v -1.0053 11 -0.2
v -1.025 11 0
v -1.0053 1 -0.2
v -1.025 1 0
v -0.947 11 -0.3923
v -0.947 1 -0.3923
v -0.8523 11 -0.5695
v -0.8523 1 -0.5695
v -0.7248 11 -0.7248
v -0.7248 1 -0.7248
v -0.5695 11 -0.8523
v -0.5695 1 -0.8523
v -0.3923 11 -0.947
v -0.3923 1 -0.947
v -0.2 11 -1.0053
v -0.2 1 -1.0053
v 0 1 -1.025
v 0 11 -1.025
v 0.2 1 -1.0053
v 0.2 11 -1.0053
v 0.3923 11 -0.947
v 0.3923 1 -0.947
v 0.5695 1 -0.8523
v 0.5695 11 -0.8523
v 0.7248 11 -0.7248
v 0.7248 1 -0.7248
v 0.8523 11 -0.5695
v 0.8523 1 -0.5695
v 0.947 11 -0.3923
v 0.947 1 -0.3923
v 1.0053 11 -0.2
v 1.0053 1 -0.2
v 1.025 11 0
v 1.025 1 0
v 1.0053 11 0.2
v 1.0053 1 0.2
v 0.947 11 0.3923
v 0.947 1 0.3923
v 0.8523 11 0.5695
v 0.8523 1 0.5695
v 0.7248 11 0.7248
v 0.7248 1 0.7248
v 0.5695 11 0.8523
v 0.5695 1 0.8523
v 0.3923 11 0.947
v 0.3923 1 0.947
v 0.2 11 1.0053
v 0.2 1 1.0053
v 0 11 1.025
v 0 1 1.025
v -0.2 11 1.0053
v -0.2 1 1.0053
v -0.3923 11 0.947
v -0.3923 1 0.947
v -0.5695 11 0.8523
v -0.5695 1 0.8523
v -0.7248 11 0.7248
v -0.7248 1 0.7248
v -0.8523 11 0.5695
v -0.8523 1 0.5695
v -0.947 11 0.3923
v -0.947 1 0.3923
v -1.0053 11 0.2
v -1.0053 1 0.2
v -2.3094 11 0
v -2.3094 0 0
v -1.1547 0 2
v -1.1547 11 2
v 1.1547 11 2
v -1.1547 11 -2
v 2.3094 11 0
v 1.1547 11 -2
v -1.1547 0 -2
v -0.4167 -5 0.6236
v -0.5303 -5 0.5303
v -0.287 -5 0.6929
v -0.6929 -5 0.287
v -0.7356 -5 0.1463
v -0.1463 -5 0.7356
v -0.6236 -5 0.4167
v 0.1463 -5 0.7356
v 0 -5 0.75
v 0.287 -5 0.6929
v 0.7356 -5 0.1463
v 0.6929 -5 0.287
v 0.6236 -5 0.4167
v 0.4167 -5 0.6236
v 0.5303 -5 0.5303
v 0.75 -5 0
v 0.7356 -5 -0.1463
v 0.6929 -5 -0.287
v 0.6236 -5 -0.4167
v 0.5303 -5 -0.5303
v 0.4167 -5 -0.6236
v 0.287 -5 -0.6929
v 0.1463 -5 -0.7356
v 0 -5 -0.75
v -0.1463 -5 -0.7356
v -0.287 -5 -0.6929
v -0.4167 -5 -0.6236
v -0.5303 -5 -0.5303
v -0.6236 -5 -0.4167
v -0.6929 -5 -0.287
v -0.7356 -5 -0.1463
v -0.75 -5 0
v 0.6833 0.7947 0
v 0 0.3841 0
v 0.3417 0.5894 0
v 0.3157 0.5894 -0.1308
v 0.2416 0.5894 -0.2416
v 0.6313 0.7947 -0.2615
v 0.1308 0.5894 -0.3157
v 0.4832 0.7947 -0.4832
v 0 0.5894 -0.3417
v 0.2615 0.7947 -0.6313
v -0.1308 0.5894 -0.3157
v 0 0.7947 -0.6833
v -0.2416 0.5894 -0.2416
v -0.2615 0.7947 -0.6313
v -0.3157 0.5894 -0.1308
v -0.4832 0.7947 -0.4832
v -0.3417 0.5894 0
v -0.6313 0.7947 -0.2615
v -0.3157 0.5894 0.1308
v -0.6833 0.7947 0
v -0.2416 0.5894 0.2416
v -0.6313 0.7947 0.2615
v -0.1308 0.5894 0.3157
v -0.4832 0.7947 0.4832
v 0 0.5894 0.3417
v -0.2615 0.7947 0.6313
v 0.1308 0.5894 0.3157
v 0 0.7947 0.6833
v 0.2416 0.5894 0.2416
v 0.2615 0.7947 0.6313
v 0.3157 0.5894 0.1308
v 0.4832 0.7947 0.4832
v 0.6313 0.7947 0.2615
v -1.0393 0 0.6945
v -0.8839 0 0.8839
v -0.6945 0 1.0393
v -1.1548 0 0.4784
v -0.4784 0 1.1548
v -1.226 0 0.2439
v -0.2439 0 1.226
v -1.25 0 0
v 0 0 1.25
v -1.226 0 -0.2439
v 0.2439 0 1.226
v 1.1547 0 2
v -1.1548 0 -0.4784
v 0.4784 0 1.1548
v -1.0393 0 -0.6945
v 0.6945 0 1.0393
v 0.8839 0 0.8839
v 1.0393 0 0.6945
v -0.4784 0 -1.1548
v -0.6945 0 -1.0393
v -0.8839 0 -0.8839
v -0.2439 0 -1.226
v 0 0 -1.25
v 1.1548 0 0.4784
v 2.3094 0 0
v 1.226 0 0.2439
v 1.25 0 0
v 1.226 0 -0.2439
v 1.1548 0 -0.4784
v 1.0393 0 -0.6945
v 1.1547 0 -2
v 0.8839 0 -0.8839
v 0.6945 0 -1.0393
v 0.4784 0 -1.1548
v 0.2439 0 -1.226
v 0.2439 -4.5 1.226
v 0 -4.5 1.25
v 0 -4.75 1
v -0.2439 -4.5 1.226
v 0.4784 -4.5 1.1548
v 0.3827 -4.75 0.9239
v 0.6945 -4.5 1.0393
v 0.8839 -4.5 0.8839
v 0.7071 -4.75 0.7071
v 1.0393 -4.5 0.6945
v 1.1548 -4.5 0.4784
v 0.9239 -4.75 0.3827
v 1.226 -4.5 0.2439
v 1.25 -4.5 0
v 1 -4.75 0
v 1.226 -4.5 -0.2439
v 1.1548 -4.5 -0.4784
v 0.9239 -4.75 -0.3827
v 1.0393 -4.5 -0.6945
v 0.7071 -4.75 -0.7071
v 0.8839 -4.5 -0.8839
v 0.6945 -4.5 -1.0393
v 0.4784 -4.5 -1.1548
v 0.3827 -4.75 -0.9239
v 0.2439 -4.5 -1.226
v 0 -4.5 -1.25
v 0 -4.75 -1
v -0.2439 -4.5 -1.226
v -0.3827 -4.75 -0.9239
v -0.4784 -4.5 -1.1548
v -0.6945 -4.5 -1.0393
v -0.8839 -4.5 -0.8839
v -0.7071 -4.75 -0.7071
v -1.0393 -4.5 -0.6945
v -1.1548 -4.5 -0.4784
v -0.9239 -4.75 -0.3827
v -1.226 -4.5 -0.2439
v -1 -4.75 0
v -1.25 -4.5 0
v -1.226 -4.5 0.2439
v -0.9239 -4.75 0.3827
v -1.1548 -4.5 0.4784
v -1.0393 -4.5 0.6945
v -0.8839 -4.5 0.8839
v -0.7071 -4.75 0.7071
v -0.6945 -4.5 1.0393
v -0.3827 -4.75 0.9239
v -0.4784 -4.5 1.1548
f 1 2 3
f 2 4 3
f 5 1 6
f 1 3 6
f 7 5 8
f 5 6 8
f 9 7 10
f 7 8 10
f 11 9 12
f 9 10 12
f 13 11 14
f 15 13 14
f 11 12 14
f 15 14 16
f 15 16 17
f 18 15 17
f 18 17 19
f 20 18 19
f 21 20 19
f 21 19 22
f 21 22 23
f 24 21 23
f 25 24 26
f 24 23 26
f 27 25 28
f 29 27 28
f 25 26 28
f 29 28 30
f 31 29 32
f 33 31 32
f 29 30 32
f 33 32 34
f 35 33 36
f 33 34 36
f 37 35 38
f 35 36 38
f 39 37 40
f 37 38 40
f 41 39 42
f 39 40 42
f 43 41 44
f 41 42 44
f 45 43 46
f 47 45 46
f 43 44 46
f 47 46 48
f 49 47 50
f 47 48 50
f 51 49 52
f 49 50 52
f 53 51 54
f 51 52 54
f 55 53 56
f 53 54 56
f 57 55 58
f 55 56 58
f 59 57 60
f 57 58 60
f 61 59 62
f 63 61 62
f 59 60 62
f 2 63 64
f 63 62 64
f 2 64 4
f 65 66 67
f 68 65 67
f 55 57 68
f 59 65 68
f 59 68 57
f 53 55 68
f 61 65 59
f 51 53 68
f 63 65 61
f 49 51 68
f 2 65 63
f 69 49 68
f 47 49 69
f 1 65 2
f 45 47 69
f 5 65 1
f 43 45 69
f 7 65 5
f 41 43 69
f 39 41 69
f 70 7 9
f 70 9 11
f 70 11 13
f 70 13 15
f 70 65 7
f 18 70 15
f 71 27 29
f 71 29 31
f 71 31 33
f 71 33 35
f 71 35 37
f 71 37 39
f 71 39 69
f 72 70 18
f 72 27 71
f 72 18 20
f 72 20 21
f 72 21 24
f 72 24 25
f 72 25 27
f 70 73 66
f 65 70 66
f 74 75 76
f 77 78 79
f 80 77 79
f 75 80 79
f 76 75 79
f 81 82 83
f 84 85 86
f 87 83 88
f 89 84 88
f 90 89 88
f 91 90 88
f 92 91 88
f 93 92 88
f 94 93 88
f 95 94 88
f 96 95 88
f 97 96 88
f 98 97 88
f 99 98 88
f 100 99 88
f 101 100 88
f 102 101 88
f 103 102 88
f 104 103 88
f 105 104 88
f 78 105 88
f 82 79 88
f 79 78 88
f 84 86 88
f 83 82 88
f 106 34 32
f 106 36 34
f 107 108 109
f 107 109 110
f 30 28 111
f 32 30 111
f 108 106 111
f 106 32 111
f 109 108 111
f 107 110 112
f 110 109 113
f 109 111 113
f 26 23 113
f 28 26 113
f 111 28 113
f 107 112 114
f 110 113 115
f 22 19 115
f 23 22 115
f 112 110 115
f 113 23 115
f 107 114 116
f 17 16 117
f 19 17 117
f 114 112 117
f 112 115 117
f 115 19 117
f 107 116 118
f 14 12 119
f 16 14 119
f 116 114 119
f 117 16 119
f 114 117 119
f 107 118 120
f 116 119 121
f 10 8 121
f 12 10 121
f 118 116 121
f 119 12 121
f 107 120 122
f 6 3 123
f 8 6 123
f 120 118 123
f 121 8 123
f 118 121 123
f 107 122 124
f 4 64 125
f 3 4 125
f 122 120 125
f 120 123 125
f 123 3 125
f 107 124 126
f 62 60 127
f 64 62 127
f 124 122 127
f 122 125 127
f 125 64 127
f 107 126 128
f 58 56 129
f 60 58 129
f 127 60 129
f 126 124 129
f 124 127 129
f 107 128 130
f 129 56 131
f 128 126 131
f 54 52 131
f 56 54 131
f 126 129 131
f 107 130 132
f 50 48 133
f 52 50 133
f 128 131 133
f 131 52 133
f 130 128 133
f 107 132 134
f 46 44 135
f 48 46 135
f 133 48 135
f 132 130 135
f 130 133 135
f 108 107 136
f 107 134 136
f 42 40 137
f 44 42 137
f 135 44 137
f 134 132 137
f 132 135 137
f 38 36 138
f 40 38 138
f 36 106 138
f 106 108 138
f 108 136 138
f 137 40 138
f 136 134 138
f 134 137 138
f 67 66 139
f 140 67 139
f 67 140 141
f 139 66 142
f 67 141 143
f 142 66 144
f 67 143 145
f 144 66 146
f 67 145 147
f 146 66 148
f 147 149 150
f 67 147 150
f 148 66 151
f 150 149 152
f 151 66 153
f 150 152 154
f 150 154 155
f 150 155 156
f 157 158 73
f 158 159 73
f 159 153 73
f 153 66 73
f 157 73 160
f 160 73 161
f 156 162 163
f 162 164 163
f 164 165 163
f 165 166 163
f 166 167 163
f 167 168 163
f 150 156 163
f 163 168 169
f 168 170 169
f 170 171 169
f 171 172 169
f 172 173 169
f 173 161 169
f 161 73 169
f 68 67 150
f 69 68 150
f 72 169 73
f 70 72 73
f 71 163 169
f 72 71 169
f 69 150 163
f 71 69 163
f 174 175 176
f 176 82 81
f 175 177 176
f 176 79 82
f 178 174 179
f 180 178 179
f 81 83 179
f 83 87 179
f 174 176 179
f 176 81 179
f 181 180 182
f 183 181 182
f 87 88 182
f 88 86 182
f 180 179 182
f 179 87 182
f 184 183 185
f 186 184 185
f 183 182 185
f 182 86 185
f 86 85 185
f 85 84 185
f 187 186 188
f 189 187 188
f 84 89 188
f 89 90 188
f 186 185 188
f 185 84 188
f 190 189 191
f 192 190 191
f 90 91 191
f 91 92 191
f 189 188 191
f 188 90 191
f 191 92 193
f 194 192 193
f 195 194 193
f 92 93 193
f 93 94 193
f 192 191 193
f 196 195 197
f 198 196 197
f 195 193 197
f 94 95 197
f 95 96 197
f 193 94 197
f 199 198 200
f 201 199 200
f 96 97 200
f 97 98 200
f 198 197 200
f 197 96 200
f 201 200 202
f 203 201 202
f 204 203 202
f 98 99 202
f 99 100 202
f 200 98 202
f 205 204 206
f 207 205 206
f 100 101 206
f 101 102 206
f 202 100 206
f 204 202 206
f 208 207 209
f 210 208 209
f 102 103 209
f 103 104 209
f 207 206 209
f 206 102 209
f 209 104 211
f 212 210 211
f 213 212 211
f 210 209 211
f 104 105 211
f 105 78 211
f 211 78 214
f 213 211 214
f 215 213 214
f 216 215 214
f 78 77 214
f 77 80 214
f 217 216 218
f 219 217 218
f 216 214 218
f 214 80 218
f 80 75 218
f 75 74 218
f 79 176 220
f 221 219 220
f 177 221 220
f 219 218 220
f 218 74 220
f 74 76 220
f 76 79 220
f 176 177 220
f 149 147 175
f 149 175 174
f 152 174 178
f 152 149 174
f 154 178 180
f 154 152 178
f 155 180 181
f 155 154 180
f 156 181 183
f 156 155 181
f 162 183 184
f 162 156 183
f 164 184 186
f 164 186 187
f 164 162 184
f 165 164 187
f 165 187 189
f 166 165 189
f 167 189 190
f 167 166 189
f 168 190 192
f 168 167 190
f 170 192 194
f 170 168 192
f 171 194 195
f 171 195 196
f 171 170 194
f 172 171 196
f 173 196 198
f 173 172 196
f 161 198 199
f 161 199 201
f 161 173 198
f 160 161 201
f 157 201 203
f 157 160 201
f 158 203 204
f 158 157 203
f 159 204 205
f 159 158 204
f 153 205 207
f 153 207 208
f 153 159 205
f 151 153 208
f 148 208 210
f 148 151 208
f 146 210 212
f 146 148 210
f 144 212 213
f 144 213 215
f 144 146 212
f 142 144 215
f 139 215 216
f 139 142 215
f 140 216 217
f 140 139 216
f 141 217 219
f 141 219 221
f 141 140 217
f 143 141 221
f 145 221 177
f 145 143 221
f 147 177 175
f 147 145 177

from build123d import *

# Parameters (mm, degrees)
BOSS_EXTRUDE1_DEPTH     = 11
SKETCH1_3_R             = 1.25
BOSS_EXTRUDE2_DEPTH     = 5
CHAMFER1_SIZE           = 0.5
M2_5_TAPPED_HOLE1_D     = 2.05
M2_5_TAPPED_HOLE1_DEPTH = 10
M2_5_TAPPED_HOLE1_TIP   = 0.615882135


with BuildPart() as part:
    # Sketch1 → Boss-Extrude1 (new body)
    with BuildSketch(Plane(origin=(0, 0, 0), x_dir=(1, 0, 0), z_dir=(0, 1, 0))):
        Polygon((-1.154700538, -2), (1.154700538, -2), (2.309401077, 0), (1.154700538, 2), (-1.154700538, 2), (-2.309401077, 0), align=None)
    extrude(amount=BOSS_EXTRUDE1_DEPTH)

    # Sketch1<3> → Boss-Extrude2 (add)
    with BuildSketch(Plane(origin=(0, 0, 0), x_dir=(1, 0, 0), z_dir=(0, 1, 0))):
        Circle(SKETCH1_3_R)
    extrude(amount=-BOSS_EXTRUDE2_DEPTH)

    # Chamfer1
    chamfer1_edges = [part.edges().sort_by_distance(p)[0] for p in [
        (-1.25, -5, 0),
    ]]
    chamfer(chamfer1_edges, length=CHAMFER1_SIZE)

    # M2.5 Tapped Hole1
    with Locations(Plane(origin=(0, 11, 0), x_dir=(1, 0, 0), z_dir=(0, 1, 0))):
        with Locations((0, 0)):
            Hole(M2_5_TAPPED_HOLE1_D / 2, depth=M2_5_TAPPED_HOLE1_DEPTH)
            with Locations((0, 0, -(M2_5_TAPPED_HOLE1_DEPTH + M2_5_TAPPED_HOLE1_TIP / 2))):  # 118° drill point
                Cone(0, M2_5_TAPPED_HOLE1_D / 2, M2_5_TAPPED_HOLE1_TIP, mode=Mode.SUBTRACT)


solid = part.part
